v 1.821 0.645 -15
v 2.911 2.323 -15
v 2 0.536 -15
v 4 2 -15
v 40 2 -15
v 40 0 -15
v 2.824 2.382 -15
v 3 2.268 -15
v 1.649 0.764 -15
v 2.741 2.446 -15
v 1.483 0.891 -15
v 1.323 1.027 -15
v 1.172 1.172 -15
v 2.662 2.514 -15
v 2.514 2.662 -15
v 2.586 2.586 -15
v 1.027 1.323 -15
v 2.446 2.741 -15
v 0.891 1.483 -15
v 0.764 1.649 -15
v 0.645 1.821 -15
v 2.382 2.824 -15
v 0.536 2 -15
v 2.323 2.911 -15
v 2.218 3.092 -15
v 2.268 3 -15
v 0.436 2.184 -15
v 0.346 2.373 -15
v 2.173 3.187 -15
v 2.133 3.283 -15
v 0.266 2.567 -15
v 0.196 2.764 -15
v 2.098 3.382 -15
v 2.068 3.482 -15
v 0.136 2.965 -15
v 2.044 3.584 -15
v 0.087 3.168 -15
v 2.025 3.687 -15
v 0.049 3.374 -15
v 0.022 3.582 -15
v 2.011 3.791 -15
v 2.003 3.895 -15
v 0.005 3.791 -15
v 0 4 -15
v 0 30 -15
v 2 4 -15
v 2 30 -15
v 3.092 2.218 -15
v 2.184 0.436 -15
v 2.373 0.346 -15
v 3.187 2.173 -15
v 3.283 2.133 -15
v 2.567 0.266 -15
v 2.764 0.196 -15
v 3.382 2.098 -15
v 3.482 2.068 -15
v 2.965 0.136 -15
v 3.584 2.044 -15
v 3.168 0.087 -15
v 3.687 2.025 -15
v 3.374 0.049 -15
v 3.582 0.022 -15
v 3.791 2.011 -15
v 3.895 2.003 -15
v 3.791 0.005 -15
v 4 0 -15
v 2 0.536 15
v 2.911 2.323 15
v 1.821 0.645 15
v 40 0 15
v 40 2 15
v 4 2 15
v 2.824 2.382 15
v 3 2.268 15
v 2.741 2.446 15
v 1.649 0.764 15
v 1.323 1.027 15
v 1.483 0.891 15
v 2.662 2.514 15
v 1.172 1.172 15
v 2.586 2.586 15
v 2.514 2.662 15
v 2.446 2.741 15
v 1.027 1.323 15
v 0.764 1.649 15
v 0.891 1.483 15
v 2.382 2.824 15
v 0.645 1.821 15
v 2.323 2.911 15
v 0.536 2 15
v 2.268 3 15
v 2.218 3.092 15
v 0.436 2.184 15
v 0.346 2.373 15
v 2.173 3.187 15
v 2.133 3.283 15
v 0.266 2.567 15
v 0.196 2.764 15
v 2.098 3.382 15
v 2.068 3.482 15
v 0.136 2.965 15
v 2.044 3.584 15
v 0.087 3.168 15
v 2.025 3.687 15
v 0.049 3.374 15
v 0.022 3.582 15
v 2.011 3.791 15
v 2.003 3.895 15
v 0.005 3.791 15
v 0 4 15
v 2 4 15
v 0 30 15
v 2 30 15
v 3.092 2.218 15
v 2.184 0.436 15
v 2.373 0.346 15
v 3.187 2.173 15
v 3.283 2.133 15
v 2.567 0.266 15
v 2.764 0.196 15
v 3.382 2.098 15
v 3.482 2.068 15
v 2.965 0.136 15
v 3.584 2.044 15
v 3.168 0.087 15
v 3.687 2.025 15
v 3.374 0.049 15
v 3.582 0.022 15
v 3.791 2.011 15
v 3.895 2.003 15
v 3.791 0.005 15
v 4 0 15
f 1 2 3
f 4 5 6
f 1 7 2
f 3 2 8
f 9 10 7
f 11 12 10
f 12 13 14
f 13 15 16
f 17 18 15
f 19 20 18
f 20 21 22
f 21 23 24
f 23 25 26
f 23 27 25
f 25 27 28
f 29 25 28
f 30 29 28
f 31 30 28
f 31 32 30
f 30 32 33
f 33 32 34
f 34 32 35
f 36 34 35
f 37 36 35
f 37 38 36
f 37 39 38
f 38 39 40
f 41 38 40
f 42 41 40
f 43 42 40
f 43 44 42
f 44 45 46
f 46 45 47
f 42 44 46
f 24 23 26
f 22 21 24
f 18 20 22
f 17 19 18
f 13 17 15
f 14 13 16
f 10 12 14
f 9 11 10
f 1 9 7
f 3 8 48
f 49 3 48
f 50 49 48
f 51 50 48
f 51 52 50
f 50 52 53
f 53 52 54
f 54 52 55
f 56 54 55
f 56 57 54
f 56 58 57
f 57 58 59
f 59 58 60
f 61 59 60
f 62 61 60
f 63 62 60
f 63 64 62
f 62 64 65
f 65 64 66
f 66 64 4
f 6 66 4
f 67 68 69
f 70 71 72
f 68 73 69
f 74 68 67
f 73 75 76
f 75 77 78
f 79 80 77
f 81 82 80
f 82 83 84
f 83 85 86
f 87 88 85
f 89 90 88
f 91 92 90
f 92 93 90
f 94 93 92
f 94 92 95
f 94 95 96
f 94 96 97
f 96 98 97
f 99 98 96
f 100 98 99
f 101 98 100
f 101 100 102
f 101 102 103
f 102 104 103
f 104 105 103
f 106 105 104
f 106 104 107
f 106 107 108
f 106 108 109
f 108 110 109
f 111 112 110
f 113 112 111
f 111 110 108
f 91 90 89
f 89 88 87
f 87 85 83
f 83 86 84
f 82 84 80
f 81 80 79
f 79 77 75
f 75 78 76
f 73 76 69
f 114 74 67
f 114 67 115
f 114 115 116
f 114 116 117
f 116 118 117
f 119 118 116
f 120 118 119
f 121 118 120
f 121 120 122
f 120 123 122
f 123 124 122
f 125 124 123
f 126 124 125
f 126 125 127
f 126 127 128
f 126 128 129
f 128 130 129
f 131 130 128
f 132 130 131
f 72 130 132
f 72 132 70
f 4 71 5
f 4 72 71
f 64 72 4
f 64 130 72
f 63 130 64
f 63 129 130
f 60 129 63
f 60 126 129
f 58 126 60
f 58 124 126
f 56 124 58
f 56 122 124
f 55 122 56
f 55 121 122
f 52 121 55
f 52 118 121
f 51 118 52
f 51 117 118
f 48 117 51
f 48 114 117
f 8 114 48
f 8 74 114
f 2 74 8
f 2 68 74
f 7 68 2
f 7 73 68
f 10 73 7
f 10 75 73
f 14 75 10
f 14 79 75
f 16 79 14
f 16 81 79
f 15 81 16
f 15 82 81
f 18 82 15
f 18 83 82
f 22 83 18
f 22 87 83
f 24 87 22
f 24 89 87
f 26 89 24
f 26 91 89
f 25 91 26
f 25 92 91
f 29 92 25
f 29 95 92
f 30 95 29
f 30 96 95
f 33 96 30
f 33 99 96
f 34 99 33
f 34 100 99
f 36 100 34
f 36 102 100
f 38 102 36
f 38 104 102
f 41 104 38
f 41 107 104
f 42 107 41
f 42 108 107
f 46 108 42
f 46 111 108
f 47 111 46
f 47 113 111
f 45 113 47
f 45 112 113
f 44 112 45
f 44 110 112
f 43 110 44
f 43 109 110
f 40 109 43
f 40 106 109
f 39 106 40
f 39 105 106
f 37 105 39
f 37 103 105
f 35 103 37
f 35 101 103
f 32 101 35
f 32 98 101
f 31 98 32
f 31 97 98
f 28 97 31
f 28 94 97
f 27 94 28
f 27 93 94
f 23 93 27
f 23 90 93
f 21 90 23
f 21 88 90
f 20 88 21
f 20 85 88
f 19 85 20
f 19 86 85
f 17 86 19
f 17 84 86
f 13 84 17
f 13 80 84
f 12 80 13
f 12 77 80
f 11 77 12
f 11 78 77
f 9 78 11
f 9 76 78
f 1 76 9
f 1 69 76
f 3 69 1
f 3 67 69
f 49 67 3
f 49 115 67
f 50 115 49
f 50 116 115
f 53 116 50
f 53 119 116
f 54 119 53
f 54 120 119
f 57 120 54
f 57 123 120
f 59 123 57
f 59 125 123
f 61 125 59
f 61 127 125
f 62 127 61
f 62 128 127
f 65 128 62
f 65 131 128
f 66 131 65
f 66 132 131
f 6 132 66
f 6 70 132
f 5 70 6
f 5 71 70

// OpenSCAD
// Constant-thickness 2.0 mm sheet-metal L-bracket
// Designed for manufacturing (DFM) with exact flat-pattern calculations.

// --- Parameters ---
thickness = 2.0;             // Sheet metal thickness (T)
inside_radius = 2.0;         // Inside bend radius (R)
width = 30.0;                // Bracket width (W)
flange1_outside = 40.0;      // Outside length of Flange 1 (L1)
flange2_outside = 30.0;      // Outside length of Flange 2 (L2)
k_factor = 0.45;             // K-factor for bend allowance calculation
angle = 90.0;                // Bend angle in degrees

// --- Calculations ---
PI = 3.141592653589793;
outside_radius = inside_radius + thickness;

// Standard sheet metal flat pattern formula:
// Flat Length = (L1 - T - R) + (L2 - T - R) + Bend Allowance
flange1_flat = flange1_outside - thickness - inside_radius;
flange2_flat = flange2_outside - thickness - inside_radius;
bend_allowance = (angle * PI / 180.0) * (inside_radius + k_factor * thickness);
flat_length = flange1_flat + flange2_flat + bend_allowance;

// --- Print Manifest to Console ---
echo(str("MAKERBENCH-SHEETMETAL: {\"thickness_mm\": ", thickness, ", \"bend_radius_mm\": ", inside_radius, ", \"flat_length_mm\": ", flat_length, "}"));

// --- 3D Model Generation ---
module l_bracket() {
    // Center of the concentric bend radii
    center = [outside_radius, outside_radius];
    steps = 30; // Resolution of the 90-degree bend
    
    // Generate outside arc points (from 180 to 270 degrees)
    outside_arc = [
        for (i = [0 : steps]) 
            let(a = 180 + (90 * i / steps))
            [center[0] + outside_radius * cos(a), center[1] + outside_radius * sin(a)]
    ];
    
    // Generate inside arc points (from 270 down to 180 degrees)
    inside_arc = [
        for (i = [0 : steps]) 
            let(a = 270 - (90 * i / steps))
            [center[0] + inside_radius * cos(a), center[1] + inside_radius * sin(a)]
    ];
    
    // Combine into a single continuous 2D profile path (counter-clockwise)
    profile_points = concat(
        [[0, flange2_outside]],          // Top-left outside corner
        outside_arc,                      // Outside corner bend
        [[flange1_outside, 0]],          // Bottom-right outside corner
        [[flange1_outside, thickness]],  // Bottom-right inside corner
        inside_arc,                       // Inside corner bend
        [[thickness, flange2_outside]]   // Top-left inside corner
    );
    
    // Extrude the 2D profile symmetrically along the Y-axis
    linear_extrude(height = width, center = true, convexity = 10) {
        polygon(points = profile_points);
    }
}

// Render the final bracket
l_bracket();
